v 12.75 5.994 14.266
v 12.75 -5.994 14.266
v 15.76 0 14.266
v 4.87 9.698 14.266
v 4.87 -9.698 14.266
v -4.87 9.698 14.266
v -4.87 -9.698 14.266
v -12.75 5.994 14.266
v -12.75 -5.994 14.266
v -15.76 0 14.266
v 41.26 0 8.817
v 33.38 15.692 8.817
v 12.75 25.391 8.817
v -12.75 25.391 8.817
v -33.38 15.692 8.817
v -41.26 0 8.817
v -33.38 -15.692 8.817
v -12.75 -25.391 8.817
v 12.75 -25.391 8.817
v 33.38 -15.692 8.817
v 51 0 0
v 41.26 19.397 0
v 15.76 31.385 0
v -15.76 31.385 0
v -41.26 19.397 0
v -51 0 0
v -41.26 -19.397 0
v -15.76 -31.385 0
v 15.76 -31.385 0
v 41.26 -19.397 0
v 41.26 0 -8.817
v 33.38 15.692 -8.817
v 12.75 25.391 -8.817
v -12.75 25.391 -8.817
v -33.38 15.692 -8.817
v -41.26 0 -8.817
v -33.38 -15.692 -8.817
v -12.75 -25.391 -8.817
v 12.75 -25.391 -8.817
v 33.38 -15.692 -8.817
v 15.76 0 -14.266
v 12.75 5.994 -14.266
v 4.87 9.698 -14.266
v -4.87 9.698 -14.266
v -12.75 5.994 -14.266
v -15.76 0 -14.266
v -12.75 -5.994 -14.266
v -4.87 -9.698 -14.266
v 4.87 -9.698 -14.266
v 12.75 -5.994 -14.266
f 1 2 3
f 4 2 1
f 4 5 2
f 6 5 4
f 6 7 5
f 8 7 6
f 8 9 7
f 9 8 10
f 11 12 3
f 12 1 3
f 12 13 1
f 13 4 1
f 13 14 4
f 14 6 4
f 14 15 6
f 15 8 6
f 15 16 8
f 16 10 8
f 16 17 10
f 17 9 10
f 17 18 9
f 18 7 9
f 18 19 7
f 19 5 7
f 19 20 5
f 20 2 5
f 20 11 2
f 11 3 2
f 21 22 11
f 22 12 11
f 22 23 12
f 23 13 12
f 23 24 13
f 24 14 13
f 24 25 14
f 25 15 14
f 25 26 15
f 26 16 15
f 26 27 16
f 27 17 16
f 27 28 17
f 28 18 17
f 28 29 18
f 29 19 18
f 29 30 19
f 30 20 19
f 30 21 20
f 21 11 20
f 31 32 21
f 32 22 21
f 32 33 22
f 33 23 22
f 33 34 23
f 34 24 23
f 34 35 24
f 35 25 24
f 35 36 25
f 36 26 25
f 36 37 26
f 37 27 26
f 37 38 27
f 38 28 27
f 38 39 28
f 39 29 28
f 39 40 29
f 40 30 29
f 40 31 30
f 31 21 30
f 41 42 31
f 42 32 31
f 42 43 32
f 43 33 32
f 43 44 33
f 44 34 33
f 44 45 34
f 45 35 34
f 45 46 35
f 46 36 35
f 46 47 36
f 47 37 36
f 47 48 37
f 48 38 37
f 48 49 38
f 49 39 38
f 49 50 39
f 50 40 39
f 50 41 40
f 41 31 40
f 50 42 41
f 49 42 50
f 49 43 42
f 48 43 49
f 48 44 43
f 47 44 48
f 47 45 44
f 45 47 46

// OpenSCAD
// Generated by SolidPython 1.0.1 on 2020-07-29 00:46:53


scale(v = [17, 11, 5]) {
	sphere(r = 3);
}
/***********************************************
*********      SolidPython code:      **********
************************************************
 
# import packages: SolidPython
from solid import *
from solid.utils import *
from itertools import chain, combinations, permutations


class Resize:

    def __init__(self, scad_file):
        self.scad_file = scad_file
        #self.scad_file = import_scad(scad_file)
        # cone/cylinder param:
        self.r1 = 0
        self.r2 = 0
        self.h = 0
        # rectangular prism param:
        self.w = 0
        self.l = 0
        # ellipse param:
        self.r = 0

    # import OpenScad code (file name corresponds to shape)


    # classify shape + parameters
    def assign(self, param1, param2, param3):
        if self.scad_file == 'cone.scad':
            self.r1 = param1
            self.r2 = param2
            self.h = param3
        elif self.scad_file == 'cylinder.scad':
            self.r1 = param1
            self.r2 = param2
            self.h = param3
        elif self.scad_file == 'rectangularPrism.scad':
            self.h = param1
            self.l = param2
            self.w = param3
        else:
            self.r = param1
            self.h = param2

    # resize parameters
    def iterate(self):
        x = range(3, 20, 2)
        i = 1
        if self.scad_file == 'cone.scad':
            tempList = list(permutations(x, 2))
            for temp in tempList:
                param1 = temp[0]
                param2 = temp[1]
                filepath = 'produced_scad_files/' + 'cone' + str(param1) + '_' + str(param2) + '_' + '.scad'
                scad_render_to_file(cylinder(h=param1, r1=param2, r2=0), filepath)

        elif self.scad_file == 'cylinder.scad':
            tempList = list(permutations(x, 3))
            for temp in tempList:
                param1 = temp[0]
                param2 = temp[1]
                filepath = 'produced_scad_files/' + 'cylinder' + str(param1) + '_' + str(param2) + '_' + '.scad'
                scad_render_to_file(cylinder(h=param1, r1=param2, r2=param2), filepath)

        elif self.scad_file == 'rectangularPrism.scad':
            tempList = list(permutations(x, 3))
            for temp in tempList:
                param1 = temp[0]
                param2 = temp[1]
                param3 = temp[2]
                filepath = 'produced_scad_files/' + 'rectangularPrism' + str(param1) + '_' + str(param2) + '_' + str(
                    param3) + '.scad'
                scad_render_to_file(cube(size=(param1, param2, param3)), filepath)

        elif self.scad_file == 'ellipse.scad':
            tempList = list(permutations(x, 4))
            for temp in tempList:
                param1 = temp[0]
                param2 = temp[1]
                param3 = temp[2]
                param4 = temp[3]
                filepath = 'produced_scad_files/' + 'ellipse' + str(param1) + '_' + str(param2) + '_' + str(param3) + '_' + str(param4) + '.scad'
                scad_render_to_file(scale([param1, param2, param3])(sphere(r=param4)), filepath)

    def render_to_scadfile(self):
        scad_render_to_file(scad, 'example.scad') 
 
************************************************/
